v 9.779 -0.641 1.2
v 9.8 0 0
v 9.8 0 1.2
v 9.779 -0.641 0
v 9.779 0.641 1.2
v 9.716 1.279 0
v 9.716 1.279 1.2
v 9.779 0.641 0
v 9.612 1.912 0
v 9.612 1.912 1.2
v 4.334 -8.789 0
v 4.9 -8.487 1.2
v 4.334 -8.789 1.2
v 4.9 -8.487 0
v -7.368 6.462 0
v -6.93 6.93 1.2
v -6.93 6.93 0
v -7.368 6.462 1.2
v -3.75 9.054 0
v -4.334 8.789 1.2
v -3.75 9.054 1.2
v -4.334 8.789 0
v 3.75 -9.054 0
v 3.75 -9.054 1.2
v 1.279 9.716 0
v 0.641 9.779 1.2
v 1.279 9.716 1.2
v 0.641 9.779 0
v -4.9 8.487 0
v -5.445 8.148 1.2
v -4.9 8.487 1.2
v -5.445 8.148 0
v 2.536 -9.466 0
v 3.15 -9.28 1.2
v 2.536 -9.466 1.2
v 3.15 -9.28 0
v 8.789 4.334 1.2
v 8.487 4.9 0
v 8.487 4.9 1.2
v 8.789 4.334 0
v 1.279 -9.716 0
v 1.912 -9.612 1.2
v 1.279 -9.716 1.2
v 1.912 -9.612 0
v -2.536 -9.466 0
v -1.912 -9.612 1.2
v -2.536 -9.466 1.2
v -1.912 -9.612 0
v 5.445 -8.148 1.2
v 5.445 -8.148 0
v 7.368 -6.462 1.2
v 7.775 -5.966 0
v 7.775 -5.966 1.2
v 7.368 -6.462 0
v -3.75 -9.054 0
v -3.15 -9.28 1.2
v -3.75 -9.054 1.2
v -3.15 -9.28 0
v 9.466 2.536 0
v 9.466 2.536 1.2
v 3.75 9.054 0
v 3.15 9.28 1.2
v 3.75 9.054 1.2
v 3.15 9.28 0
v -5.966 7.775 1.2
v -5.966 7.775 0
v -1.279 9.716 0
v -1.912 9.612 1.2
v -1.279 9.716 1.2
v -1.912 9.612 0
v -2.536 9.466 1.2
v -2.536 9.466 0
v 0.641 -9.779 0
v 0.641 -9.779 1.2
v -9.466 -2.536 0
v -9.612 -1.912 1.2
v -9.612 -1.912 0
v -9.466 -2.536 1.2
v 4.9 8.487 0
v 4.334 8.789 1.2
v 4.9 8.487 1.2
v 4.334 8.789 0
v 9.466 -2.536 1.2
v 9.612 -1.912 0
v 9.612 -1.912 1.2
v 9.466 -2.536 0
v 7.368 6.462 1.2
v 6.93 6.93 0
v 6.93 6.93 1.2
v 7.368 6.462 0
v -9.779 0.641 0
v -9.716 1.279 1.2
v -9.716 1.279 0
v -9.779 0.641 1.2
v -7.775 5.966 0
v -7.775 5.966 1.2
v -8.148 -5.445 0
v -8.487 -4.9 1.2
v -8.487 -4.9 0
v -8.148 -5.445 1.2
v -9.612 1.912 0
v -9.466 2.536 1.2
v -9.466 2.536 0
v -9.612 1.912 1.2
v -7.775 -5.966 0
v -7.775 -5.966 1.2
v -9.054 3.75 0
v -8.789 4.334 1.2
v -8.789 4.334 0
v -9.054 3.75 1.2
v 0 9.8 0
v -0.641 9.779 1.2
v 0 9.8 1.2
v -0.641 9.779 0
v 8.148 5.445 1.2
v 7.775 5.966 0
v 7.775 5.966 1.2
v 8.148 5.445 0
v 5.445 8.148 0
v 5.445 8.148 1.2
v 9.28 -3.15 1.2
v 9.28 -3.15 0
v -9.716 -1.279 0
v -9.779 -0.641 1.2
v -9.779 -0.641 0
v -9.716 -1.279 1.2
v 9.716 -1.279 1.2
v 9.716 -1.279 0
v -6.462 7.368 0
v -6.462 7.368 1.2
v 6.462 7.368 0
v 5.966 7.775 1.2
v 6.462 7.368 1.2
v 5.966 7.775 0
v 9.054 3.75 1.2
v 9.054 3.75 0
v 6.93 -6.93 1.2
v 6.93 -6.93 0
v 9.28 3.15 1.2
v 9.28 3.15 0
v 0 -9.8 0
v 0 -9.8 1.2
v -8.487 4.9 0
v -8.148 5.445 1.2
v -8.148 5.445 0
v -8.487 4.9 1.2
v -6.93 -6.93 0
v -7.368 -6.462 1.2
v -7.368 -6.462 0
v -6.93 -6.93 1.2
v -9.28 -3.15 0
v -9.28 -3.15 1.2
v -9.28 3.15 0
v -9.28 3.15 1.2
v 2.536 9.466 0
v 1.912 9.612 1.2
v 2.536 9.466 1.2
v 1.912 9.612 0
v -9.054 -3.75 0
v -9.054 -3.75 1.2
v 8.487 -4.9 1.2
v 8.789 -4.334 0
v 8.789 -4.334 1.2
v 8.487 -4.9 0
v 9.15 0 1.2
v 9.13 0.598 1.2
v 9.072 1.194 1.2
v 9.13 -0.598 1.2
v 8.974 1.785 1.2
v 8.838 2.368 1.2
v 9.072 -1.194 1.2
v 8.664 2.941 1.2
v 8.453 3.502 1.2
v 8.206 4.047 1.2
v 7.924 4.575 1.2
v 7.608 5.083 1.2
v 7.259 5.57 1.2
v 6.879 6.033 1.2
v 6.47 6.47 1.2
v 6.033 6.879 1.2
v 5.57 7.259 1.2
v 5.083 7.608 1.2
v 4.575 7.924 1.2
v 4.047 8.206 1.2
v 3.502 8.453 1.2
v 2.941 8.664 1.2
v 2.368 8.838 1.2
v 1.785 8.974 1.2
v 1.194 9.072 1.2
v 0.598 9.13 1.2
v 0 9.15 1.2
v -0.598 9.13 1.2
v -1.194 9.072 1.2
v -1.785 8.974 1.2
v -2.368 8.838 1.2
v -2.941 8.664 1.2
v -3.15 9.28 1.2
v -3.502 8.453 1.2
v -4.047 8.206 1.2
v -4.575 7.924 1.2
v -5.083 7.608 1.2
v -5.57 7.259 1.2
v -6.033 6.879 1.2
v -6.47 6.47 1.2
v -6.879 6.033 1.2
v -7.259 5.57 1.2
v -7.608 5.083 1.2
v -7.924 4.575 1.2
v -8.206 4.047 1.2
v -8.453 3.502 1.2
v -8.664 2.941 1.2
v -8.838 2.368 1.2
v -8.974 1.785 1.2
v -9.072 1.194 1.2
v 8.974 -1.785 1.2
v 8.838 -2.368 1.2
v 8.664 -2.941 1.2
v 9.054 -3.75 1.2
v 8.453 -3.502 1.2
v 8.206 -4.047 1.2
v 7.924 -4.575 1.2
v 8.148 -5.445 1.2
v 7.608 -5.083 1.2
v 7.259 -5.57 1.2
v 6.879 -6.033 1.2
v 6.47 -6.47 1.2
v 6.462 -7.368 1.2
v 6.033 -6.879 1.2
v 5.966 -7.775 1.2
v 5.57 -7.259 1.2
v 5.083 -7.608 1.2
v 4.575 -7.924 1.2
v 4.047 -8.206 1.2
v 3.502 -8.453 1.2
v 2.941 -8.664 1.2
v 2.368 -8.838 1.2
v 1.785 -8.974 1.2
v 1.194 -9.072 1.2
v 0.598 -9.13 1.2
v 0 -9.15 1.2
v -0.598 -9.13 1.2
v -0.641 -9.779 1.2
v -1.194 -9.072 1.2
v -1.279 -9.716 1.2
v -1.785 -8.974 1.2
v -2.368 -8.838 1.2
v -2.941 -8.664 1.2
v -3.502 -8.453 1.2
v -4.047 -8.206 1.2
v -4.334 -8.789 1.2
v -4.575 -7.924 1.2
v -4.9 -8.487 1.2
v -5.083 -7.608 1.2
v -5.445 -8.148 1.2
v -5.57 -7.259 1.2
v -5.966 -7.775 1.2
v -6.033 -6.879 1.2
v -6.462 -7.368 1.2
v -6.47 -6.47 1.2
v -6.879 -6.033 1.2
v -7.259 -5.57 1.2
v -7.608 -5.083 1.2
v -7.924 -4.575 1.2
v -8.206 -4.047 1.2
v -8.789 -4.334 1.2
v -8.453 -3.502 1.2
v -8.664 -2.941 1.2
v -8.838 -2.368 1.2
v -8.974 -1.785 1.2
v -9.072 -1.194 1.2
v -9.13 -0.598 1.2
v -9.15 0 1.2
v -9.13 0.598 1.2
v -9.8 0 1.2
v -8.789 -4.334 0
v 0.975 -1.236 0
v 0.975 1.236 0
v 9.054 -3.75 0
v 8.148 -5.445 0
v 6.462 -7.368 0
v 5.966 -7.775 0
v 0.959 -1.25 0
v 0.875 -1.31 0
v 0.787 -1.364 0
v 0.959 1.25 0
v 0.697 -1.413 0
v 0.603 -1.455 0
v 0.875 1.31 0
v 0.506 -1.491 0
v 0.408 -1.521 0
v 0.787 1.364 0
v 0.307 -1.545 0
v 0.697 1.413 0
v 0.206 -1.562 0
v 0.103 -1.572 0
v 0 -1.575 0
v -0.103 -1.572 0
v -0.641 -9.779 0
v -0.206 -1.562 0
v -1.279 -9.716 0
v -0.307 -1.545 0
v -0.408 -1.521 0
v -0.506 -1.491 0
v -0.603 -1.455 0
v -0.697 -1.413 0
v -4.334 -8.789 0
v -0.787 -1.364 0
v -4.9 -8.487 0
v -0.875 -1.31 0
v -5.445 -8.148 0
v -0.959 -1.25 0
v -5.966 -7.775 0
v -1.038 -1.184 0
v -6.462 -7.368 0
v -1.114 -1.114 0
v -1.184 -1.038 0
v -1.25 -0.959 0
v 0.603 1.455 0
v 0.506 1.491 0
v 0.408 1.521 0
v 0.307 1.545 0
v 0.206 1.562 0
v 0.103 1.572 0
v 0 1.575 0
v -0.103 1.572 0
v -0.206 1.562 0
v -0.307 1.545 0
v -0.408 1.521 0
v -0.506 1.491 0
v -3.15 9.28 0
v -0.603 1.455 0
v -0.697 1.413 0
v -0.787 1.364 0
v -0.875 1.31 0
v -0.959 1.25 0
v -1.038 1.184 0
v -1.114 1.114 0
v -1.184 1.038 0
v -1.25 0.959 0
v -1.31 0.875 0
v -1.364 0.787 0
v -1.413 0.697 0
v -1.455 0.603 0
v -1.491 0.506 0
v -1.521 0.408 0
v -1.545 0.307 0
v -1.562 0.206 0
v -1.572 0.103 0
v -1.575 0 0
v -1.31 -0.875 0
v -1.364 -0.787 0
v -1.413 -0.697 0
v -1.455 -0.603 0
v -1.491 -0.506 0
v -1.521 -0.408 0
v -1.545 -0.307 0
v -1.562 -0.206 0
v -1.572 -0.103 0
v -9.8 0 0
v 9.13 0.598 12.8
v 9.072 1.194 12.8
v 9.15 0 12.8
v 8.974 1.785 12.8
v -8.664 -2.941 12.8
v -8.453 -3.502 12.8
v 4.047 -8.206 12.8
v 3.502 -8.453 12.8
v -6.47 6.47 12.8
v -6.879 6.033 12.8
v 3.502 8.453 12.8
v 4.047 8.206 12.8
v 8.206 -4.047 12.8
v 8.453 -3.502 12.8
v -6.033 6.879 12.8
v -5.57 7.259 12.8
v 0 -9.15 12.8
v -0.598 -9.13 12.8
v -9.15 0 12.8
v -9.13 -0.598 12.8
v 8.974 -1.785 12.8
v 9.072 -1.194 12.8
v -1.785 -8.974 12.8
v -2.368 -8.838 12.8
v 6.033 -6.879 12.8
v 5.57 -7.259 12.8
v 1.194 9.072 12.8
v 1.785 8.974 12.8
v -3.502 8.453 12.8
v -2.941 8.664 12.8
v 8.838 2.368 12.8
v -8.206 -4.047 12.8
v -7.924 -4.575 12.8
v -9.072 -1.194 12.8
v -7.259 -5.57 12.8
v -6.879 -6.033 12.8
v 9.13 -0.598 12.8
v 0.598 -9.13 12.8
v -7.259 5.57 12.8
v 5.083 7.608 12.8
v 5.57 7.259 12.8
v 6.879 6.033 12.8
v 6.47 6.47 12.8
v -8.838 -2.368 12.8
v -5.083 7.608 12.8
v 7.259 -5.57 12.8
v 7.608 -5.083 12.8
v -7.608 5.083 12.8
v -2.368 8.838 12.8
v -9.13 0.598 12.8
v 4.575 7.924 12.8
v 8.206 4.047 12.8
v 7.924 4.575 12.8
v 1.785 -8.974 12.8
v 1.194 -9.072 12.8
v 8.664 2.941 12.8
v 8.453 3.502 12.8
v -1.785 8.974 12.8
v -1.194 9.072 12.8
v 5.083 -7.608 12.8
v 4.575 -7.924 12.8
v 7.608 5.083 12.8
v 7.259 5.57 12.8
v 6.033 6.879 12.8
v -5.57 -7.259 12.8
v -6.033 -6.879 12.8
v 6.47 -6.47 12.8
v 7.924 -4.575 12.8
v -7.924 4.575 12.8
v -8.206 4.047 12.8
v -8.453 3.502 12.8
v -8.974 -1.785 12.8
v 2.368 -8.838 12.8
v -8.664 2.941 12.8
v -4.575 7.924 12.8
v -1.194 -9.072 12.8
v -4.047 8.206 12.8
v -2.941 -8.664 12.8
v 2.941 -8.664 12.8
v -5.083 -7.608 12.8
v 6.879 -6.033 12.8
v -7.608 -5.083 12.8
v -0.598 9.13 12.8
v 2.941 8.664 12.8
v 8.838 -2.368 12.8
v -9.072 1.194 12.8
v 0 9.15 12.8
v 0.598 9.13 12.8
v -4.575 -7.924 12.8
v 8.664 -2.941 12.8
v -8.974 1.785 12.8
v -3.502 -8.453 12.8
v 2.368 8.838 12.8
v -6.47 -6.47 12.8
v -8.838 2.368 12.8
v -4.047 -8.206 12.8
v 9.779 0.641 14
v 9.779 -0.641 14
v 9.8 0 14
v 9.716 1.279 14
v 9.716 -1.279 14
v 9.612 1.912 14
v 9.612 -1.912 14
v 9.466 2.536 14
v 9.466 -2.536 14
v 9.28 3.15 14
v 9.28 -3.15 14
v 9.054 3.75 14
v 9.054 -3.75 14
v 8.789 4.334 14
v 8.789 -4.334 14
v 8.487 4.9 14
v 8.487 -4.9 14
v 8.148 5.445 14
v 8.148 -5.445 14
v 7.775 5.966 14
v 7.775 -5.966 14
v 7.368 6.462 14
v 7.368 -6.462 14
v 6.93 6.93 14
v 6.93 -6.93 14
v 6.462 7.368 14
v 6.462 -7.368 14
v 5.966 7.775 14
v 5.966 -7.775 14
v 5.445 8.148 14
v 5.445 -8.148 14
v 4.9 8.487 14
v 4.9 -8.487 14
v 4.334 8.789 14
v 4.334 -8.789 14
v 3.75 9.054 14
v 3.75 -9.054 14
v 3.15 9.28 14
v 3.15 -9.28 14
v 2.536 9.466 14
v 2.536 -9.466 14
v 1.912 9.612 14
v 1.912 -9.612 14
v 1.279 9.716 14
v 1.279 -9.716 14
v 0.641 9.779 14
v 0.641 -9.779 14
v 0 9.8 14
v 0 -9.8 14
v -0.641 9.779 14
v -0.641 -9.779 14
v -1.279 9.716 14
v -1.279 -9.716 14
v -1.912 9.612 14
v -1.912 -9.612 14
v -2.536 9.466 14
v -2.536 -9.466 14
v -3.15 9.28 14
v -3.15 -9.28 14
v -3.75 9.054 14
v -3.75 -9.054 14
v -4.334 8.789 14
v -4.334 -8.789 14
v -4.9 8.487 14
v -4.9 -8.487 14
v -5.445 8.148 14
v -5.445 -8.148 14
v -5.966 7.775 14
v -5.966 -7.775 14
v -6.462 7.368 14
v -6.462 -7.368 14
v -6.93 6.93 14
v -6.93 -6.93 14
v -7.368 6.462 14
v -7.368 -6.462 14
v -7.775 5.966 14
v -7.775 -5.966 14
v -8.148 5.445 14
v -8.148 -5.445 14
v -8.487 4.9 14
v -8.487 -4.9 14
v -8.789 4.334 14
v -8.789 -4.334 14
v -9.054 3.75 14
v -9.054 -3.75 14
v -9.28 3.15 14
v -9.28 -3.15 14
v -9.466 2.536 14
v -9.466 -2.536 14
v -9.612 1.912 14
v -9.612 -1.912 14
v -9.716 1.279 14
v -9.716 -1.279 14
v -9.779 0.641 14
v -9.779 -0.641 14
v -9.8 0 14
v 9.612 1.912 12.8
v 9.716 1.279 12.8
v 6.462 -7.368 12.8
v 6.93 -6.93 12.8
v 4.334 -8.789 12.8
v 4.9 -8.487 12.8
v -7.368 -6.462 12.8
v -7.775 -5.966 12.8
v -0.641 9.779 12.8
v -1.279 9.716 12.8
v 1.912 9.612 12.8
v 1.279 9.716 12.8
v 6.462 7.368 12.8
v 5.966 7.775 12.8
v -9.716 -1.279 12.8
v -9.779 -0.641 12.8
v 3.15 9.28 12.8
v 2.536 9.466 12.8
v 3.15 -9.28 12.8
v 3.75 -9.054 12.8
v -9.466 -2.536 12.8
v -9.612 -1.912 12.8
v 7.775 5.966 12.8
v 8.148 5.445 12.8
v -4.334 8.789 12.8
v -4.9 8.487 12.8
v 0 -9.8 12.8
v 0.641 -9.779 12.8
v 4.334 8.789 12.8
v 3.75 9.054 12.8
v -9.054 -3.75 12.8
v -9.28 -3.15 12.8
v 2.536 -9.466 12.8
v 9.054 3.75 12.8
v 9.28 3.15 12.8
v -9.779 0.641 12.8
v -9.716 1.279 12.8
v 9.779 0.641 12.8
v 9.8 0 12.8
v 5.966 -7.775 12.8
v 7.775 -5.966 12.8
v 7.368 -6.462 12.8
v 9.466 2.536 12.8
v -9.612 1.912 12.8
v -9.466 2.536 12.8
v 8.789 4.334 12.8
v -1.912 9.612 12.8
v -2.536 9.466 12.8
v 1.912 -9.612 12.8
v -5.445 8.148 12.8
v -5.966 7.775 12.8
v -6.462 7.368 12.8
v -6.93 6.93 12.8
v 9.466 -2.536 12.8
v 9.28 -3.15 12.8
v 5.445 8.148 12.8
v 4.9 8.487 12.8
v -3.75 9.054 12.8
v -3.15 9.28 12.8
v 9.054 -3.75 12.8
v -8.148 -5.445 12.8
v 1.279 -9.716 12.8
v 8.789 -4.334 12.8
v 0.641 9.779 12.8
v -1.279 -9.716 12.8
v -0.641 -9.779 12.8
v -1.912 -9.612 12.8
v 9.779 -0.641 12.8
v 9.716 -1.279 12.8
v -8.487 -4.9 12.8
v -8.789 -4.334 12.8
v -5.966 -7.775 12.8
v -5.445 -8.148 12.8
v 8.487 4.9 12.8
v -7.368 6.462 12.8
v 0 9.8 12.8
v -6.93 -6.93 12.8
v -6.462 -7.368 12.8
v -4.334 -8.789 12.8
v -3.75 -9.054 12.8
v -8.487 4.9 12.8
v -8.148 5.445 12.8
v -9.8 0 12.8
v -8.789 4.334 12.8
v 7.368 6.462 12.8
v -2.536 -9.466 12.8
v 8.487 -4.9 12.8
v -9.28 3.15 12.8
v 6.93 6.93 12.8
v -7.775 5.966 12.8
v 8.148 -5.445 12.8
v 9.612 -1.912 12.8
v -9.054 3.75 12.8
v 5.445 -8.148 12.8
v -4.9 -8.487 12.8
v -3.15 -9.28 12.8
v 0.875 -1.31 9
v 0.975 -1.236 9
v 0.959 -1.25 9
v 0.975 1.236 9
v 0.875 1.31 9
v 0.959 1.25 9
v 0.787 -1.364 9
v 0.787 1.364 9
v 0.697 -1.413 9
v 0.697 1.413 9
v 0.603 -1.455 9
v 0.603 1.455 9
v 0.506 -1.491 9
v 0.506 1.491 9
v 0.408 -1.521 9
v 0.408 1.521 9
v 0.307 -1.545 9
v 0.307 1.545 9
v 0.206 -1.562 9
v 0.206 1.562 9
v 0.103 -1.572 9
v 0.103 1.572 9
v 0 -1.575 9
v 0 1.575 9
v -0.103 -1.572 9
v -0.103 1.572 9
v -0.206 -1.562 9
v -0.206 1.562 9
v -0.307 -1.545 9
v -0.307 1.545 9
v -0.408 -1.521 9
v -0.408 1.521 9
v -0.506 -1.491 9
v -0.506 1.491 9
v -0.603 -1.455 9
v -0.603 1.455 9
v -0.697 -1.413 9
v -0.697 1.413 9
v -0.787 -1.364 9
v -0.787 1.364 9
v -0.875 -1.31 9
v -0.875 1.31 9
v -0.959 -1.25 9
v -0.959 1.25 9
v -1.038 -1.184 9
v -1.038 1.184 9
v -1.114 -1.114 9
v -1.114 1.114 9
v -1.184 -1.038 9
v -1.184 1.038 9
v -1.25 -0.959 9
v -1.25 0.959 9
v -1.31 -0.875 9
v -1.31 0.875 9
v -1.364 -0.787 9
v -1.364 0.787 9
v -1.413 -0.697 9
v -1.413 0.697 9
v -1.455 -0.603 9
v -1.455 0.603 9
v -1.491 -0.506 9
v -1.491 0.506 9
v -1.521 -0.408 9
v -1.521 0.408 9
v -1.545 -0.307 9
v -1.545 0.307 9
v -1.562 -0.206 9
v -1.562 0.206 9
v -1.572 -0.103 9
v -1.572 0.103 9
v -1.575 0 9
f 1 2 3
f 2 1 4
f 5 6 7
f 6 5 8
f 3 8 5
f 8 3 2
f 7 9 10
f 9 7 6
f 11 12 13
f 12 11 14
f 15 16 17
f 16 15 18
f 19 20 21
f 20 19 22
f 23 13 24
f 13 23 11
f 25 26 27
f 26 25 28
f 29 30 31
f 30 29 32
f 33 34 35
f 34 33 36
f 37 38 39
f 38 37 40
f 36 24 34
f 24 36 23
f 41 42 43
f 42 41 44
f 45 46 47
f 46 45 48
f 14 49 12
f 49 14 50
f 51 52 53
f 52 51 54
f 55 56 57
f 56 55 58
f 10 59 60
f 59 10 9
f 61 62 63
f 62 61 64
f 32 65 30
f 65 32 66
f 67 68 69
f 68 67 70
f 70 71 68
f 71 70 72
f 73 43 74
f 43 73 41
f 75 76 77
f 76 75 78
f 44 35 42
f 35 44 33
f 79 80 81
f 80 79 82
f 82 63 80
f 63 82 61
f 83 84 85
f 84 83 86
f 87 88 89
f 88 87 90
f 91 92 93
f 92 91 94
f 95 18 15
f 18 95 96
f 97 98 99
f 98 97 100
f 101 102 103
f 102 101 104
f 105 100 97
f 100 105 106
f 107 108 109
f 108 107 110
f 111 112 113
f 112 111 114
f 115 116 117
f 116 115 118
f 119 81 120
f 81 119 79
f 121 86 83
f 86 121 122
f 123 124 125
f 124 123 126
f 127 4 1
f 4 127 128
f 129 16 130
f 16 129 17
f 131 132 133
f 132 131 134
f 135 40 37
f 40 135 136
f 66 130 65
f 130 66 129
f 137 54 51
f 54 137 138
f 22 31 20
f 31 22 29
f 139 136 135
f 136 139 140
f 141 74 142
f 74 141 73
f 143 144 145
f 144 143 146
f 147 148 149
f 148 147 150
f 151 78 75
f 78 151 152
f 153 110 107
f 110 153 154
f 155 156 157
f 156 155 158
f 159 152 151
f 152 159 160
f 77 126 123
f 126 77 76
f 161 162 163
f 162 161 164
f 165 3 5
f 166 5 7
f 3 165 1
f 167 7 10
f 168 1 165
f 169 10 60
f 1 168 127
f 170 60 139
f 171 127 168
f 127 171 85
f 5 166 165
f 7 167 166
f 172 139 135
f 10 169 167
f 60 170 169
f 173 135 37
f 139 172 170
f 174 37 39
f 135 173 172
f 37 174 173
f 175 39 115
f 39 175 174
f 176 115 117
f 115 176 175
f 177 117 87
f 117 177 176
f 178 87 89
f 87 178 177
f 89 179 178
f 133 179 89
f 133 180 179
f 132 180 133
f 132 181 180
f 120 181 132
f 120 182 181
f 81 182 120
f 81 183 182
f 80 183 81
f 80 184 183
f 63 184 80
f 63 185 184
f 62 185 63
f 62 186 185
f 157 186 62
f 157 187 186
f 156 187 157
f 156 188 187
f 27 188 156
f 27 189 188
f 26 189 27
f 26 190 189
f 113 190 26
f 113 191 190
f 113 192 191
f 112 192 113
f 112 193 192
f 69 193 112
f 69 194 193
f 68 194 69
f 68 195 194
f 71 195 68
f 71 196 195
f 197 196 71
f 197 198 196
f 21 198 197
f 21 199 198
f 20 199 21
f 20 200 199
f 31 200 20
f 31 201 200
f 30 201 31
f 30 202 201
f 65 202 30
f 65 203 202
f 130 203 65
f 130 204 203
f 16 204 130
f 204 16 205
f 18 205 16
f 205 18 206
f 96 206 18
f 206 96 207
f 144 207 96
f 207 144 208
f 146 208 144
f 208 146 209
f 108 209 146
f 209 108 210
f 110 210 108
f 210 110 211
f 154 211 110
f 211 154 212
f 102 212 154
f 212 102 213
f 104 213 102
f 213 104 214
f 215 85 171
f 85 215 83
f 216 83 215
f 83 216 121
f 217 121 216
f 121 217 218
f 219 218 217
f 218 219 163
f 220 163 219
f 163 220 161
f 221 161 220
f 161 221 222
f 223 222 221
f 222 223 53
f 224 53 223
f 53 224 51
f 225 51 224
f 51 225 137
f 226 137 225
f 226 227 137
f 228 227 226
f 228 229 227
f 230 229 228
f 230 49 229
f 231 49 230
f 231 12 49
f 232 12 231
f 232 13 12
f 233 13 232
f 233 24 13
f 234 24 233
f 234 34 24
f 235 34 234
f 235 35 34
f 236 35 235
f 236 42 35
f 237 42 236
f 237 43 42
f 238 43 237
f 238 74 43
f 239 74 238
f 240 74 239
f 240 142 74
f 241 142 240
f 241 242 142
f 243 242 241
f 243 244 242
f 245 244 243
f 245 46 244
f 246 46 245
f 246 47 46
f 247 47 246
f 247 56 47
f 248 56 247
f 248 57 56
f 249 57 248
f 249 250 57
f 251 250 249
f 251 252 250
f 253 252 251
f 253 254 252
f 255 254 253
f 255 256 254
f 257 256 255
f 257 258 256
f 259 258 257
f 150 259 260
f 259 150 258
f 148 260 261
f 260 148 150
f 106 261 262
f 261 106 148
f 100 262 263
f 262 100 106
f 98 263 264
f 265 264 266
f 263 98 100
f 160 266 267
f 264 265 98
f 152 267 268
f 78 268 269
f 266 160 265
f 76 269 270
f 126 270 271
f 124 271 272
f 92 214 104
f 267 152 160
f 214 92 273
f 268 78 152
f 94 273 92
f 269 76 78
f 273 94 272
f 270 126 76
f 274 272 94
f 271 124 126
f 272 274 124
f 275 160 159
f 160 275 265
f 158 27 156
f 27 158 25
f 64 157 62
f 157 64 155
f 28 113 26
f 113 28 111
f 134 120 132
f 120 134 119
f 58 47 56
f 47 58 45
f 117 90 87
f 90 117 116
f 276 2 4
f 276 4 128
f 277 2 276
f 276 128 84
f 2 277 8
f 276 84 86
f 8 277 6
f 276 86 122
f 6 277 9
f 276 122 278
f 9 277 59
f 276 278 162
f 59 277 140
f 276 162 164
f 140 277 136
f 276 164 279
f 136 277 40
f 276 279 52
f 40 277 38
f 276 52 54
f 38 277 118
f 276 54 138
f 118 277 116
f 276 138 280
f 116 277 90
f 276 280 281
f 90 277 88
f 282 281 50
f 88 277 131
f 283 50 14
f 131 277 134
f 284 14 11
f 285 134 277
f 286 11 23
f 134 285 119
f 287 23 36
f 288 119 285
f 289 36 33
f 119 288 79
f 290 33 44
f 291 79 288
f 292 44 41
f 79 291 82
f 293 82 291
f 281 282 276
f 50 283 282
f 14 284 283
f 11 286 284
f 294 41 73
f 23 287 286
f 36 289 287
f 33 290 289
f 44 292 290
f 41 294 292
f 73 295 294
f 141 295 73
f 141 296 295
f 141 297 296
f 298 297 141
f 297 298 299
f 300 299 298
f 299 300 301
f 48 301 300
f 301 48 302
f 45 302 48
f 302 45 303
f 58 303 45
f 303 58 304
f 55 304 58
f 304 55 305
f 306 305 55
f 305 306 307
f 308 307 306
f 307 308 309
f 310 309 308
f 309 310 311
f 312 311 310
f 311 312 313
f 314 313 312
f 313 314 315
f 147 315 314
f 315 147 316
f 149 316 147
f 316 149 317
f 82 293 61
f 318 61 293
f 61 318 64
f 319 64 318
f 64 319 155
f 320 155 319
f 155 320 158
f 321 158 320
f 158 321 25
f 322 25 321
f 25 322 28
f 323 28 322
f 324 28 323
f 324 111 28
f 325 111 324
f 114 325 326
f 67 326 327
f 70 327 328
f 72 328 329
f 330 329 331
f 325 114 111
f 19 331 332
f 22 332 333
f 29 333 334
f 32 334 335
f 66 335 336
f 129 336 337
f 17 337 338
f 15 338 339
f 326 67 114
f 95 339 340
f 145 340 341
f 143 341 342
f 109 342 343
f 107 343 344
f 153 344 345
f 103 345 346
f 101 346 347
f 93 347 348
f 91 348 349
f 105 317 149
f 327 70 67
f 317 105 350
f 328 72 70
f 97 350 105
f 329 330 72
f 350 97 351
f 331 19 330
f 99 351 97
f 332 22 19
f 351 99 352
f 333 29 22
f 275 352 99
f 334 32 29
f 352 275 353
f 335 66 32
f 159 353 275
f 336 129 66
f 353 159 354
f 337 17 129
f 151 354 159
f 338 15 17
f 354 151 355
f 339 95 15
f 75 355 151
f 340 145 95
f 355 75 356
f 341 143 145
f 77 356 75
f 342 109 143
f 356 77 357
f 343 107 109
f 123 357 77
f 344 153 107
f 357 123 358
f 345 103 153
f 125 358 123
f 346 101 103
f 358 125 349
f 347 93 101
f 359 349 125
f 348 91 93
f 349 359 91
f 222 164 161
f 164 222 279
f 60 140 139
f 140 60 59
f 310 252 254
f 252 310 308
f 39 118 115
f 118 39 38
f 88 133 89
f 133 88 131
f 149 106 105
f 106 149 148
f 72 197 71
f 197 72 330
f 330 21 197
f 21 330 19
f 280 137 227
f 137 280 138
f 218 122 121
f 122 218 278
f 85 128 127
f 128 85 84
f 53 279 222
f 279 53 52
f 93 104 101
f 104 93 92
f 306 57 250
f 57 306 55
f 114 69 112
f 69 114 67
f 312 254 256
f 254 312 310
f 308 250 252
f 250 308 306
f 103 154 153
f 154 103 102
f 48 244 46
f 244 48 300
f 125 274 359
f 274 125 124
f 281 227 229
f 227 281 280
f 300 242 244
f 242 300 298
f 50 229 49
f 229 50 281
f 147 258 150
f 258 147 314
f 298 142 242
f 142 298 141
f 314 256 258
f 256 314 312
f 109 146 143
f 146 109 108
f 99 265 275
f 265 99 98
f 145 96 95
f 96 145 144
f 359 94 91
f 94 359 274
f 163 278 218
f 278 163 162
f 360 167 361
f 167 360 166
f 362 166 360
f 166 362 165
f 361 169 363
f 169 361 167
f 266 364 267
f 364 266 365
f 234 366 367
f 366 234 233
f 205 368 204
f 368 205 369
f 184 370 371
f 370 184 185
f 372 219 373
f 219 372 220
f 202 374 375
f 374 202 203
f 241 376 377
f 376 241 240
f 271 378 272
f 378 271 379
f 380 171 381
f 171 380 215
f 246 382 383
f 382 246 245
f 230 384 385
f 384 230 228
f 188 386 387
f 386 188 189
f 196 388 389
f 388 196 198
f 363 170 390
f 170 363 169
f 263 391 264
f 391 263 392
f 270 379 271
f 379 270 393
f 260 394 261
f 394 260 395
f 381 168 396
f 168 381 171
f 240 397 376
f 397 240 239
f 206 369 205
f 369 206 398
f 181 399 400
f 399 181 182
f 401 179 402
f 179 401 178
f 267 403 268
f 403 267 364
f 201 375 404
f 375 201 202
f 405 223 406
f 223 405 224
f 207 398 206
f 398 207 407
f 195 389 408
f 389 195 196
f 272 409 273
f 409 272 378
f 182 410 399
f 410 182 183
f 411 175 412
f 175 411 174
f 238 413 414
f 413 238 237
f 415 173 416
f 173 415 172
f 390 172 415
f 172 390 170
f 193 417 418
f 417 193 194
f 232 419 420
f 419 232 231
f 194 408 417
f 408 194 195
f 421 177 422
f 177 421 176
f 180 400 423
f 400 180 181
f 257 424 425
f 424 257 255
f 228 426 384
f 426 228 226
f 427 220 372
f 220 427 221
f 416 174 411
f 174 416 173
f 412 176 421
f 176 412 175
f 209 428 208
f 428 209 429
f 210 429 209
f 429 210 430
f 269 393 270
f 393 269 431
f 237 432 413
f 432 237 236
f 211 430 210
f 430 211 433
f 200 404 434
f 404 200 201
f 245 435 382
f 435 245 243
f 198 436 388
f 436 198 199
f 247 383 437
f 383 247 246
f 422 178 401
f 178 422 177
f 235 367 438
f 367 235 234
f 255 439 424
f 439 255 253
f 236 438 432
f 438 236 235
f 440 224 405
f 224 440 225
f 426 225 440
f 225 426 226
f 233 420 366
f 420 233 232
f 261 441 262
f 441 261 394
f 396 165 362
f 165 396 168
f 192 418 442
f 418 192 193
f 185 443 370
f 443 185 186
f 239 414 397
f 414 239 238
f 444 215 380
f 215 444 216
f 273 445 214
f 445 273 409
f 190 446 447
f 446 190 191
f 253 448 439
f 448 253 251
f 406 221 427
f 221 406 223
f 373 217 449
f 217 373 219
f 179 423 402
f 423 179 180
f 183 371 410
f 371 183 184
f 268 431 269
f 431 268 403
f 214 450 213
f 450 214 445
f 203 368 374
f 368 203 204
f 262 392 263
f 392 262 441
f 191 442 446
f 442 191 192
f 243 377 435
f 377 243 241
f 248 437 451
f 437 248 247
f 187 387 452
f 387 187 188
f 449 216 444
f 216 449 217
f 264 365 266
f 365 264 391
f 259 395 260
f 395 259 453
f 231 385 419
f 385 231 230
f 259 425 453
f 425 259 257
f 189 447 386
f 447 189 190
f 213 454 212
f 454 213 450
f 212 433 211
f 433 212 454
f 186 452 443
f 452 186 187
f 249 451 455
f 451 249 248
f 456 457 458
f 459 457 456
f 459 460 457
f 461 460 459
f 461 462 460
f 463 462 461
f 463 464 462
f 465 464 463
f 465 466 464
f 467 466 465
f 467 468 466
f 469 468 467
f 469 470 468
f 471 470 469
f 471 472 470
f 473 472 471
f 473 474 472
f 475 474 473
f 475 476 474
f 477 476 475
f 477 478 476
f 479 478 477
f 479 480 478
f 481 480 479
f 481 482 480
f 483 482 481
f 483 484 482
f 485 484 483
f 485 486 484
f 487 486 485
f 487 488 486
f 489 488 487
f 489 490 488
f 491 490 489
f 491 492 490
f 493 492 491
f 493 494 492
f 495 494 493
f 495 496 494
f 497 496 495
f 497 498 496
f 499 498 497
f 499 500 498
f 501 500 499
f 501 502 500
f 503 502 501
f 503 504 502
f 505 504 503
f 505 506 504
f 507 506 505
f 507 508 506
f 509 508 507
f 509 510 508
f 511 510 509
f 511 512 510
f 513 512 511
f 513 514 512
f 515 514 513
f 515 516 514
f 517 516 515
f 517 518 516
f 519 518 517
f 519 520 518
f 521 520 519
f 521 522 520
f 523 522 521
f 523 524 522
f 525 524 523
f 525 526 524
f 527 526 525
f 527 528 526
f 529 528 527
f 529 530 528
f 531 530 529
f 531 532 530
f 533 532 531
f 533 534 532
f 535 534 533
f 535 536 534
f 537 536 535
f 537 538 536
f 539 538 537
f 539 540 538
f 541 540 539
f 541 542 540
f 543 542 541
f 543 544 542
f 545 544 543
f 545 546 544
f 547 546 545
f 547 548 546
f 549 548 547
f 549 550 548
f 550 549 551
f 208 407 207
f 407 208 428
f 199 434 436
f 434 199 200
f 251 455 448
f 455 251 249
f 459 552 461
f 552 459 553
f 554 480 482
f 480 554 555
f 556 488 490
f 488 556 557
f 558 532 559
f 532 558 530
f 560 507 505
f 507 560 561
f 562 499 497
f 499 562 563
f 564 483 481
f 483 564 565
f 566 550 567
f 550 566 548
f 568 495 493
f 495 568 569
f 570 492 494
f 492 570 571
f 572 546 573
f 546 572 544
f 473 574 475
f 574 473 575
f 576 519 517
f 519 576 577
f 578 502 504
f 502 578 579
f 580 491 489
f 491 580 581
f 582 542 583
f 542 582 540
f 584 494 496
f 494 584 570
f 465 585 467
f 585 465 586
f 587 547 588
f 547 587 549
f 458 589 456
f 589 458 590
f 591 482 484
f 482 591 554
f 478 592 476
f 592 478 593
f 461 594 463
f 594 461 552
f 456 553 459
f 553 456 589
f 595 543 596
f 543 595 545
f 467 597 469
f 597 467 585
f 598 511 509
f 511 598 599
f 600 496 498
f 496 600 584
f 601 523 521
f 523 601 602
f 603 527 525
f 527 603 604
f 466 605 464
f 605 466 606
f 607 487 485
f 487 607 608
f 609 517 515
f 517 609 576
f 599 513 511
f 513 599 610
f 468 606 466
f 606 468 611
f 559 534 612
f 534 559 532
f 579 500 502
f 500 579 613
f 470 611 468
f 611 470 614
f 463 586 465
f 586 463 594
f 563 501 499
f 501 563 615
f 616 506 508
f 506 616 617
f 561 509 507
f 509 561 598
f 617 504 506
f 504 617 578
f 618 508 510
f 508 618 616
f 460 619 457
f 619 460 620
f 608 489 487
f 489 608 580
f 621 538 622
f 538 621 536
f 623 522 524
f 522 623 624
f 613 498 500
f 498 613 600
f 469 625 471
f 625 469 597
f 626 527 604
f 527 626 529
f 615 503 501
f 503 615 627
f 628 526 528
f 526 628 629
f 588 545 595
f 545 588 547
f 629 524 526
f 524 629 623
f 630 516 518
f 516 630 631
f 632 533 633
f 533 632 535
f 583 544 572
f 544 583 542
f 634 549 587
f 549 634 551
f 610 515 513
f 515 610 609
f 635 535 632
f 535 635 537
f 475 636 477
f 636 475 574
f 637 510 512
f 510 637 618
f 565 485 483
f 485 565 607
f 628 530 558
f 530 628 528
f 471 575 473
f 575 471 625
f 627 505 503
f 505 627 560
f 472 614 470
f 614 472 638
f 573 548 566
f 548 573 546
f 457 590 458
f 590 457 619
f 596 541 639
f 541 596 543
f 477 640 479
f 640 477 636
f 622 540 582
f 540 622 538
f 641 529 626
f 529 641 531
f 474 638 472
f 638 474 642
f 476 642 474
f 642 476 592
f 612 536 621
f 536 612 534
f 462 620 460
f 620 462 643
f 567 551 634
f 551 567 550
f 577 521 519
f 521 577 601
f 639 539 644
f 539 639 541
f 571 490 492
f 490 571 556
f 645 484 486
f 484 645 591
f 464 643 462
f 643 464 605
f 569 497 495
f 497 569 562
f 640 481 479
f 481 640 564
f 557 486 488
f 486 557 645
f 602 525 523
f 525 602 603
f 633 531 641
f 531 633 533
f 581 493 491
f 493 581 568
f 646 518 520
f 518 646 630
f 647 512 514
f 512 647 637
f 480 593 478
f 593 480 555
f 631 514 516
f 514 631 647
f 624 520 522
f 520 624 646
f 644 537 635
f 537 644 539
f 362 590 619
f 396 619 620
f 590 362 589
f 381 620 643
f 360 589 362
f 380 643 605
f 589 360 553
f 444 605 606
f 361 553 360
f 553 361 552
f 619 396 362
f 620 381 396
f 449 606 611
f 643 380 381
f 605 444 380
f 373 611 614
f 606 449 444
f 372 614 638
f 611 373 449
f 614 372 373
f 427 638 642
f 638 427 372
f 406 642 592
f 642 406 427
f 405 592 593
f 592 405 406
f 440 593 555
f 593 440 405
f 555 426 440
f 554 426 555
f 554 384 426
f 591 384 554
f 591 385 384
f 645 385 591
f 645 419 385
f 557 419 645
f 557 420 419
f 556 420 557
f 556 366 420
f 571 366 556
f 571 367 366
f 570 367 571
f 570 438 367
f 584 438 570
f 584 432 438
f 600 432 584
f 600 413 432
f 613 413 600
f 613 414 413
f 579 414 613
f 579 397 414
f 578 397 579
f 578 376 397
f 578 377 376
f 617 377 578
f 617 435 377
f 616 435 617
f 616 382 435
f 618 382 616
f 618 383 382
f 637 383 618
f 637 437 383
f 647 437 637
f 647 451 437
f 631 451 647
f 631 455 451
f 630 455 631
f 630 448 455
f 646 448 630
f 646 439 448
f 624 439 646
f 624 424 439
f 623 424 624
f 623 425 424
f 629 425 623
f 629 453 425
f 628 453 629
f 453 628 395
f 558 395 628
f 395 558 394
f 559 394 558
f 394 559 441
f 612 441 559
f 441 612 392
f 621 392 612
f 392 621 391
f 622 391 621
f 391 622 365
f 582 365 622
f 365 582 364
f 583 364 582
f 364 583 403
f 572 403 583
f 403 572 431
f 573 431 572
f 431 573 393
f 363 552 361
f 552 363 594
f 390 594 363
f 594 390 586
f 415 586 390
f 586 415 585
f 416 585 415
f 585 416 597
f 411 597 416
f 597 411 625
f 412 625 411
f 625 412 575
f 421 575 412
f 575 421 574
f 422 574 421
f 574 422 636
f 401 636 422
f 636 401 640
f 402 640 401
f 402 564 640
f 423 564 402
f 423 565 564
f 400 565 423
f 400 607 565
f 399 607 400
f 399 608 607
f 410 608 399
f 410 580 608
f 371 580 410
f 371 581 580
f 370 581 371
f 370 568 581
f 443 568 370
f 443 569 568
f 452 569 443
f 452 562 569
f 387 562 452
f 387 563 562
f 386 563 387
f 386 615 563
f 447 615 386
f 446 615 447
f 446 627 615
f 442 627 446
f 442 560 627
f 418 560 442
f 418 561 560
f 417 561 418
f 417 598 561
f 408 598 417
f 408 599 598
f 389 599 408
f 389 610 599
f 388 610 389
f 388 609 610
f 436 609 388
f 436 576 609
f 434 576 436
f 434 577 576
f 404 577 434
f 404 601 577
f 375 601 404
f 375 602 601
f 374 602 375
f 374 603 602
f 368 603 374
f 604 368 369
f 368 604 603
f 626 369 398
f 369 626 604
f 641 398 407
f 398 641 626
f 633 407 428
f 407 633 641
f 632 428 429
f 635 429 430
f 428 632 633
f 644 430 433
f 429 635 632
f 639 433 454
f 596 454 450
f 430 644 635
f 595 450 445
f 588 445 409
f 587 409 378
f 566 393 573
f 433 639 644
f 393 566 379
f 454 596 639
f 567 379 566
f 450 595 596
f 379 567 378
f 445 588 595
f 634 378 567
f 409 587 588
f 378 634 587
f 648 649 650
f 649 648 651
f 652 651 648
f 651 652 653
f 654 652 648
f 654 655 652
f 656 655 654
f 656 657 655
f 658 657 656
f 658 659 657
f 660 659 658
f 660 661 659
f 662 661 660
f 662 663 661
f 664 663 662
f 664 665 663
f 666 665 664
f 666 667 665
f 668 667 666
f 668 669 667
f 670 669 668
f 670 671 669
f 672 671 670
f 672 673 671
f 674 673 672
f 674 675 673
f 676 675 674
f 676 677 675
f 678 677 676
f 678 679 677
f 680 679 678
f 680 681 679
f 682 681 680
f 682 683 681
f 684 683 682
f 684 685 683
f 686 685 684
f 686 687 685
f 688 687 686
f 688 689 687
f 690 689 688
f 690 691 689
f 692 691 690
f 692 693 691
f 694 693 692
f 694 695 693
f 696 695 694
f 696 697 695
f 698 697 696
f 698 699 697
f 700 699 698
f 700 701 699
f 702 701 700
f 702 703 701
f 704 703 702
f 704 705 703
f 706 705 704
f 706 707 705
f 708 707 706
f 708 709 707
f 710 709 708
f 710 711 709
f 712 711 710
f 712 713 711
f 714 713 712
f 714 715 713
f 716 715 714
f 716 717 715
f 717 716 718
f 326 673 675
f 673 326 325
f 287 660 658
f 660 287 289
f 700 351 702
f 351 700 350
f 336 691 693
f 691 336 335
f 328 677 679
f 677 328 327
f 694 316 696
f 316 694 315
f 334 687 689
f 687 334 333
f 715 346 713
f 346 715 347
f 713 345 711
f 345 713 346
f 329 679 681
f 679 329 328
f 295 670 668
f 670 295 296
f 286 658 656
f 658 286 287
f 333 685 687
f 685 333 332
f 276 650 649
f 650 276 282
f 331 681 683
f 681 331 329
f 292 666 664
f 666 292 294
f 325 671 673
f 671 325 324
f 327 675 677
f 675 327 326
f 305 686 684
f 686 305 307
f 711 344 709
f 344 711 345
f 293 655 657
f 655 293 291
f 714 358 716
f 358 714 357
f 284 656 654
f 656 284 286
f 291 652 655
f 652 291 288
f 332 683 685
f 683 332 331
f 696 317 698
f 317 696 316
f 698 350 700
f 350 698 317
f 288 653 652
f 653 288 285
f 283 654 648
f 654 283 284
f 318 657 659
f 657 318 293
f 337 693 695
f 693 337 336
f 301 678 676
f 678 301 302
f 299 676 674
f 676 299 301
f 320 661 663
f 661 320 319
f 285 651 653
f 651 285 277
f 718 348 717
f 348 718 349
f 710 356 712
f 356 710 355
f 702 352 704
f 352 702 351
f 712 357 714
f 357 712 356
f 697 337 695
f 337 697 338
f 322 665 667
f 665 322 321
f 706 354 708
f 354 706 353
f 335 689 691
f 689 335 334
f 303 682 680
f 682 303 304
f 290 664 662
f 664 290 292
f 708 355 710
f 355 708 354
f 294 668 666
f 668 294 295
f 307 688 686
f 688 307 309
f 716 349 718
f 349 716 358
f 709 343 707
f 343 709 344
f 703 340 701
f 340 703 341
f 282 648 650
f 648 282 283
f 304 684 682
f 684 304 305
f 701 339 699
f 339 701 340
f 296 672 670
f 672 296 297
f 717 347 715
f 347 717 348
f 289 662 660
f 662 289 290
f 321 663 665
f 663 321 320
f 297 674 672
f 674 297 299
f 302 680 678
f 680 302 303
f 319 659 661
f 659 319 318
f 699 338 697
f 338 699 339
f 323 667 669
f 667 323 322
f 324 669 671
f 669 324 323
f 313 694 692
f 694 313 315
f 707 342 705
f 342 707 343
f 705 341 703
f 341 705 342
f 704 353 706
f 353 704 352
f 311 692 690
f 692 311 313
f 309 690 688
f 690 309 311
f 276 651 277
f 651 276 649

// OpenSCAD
// Philo bench base — rim for a 75:1 N20 gearmotor (3 mm D-shaft) that takes a
// LEGO tire 89201 / 24341 ("Tire Ø24 x 14 shallow tread"): 18 mm inner dia,
// 24 mm outer dia, 14 mm wide. Same size as LEGO rim 55982 (Ø18 x 14).
// A ready-made STL with these values is next to this file (n20_rim_lego_89201.stl).
// To tweak: change a value, F6 (render), File > Export > STL.

// ── tire fit ──
rim_width    = 14.0;   // tire width
seat_dia     = 18.3;   // where the tire sits: tire ID is 18 mm, +0.3 so it grips
lip_dia      = 19.6;   // raised lips at both edges keep the tire from walking off
lip_width    = 1.2;    // width of each lip

// ── N20 shaft: 3 mm round with one flat. Printed holes come out small, so these
//    are slightly oversized. Loosen/tighten after one test print. ──
shaft_dia    = 3.15;   // round part of the hole
shaft_flat   = 2.55;   // flat to the far side of the hole
shaft_depth  = 9.0;    // how deep the shaft goes in (N20 shafts are ~9-10 mm)

$fn = 96;

module d_hole() {
    intersection() {
        cylinder(d = shaft_dia, h = shaft_depth + 0.01);
        translate([-shaft_dia / 2, -shaft_dia / 2, 0])
            cube([shaft_flat, shaft_dia, shaft_depth + 0.01]);
    }
}

module rim() {
    difference() {
        union() {
            cylinder(d = lip_dia, h = lip_width);                                      // inner lip
            cylinder(d = seat_dia, h = rim_width);                                     // tire seat
            translate([0, 0, rim_width - lip_width]) cylinder(d = lip_dia, h = lip_width); // outer lip
        }
        translate([0, 0, -0.01]) d_hole();
    }
}

rim();
